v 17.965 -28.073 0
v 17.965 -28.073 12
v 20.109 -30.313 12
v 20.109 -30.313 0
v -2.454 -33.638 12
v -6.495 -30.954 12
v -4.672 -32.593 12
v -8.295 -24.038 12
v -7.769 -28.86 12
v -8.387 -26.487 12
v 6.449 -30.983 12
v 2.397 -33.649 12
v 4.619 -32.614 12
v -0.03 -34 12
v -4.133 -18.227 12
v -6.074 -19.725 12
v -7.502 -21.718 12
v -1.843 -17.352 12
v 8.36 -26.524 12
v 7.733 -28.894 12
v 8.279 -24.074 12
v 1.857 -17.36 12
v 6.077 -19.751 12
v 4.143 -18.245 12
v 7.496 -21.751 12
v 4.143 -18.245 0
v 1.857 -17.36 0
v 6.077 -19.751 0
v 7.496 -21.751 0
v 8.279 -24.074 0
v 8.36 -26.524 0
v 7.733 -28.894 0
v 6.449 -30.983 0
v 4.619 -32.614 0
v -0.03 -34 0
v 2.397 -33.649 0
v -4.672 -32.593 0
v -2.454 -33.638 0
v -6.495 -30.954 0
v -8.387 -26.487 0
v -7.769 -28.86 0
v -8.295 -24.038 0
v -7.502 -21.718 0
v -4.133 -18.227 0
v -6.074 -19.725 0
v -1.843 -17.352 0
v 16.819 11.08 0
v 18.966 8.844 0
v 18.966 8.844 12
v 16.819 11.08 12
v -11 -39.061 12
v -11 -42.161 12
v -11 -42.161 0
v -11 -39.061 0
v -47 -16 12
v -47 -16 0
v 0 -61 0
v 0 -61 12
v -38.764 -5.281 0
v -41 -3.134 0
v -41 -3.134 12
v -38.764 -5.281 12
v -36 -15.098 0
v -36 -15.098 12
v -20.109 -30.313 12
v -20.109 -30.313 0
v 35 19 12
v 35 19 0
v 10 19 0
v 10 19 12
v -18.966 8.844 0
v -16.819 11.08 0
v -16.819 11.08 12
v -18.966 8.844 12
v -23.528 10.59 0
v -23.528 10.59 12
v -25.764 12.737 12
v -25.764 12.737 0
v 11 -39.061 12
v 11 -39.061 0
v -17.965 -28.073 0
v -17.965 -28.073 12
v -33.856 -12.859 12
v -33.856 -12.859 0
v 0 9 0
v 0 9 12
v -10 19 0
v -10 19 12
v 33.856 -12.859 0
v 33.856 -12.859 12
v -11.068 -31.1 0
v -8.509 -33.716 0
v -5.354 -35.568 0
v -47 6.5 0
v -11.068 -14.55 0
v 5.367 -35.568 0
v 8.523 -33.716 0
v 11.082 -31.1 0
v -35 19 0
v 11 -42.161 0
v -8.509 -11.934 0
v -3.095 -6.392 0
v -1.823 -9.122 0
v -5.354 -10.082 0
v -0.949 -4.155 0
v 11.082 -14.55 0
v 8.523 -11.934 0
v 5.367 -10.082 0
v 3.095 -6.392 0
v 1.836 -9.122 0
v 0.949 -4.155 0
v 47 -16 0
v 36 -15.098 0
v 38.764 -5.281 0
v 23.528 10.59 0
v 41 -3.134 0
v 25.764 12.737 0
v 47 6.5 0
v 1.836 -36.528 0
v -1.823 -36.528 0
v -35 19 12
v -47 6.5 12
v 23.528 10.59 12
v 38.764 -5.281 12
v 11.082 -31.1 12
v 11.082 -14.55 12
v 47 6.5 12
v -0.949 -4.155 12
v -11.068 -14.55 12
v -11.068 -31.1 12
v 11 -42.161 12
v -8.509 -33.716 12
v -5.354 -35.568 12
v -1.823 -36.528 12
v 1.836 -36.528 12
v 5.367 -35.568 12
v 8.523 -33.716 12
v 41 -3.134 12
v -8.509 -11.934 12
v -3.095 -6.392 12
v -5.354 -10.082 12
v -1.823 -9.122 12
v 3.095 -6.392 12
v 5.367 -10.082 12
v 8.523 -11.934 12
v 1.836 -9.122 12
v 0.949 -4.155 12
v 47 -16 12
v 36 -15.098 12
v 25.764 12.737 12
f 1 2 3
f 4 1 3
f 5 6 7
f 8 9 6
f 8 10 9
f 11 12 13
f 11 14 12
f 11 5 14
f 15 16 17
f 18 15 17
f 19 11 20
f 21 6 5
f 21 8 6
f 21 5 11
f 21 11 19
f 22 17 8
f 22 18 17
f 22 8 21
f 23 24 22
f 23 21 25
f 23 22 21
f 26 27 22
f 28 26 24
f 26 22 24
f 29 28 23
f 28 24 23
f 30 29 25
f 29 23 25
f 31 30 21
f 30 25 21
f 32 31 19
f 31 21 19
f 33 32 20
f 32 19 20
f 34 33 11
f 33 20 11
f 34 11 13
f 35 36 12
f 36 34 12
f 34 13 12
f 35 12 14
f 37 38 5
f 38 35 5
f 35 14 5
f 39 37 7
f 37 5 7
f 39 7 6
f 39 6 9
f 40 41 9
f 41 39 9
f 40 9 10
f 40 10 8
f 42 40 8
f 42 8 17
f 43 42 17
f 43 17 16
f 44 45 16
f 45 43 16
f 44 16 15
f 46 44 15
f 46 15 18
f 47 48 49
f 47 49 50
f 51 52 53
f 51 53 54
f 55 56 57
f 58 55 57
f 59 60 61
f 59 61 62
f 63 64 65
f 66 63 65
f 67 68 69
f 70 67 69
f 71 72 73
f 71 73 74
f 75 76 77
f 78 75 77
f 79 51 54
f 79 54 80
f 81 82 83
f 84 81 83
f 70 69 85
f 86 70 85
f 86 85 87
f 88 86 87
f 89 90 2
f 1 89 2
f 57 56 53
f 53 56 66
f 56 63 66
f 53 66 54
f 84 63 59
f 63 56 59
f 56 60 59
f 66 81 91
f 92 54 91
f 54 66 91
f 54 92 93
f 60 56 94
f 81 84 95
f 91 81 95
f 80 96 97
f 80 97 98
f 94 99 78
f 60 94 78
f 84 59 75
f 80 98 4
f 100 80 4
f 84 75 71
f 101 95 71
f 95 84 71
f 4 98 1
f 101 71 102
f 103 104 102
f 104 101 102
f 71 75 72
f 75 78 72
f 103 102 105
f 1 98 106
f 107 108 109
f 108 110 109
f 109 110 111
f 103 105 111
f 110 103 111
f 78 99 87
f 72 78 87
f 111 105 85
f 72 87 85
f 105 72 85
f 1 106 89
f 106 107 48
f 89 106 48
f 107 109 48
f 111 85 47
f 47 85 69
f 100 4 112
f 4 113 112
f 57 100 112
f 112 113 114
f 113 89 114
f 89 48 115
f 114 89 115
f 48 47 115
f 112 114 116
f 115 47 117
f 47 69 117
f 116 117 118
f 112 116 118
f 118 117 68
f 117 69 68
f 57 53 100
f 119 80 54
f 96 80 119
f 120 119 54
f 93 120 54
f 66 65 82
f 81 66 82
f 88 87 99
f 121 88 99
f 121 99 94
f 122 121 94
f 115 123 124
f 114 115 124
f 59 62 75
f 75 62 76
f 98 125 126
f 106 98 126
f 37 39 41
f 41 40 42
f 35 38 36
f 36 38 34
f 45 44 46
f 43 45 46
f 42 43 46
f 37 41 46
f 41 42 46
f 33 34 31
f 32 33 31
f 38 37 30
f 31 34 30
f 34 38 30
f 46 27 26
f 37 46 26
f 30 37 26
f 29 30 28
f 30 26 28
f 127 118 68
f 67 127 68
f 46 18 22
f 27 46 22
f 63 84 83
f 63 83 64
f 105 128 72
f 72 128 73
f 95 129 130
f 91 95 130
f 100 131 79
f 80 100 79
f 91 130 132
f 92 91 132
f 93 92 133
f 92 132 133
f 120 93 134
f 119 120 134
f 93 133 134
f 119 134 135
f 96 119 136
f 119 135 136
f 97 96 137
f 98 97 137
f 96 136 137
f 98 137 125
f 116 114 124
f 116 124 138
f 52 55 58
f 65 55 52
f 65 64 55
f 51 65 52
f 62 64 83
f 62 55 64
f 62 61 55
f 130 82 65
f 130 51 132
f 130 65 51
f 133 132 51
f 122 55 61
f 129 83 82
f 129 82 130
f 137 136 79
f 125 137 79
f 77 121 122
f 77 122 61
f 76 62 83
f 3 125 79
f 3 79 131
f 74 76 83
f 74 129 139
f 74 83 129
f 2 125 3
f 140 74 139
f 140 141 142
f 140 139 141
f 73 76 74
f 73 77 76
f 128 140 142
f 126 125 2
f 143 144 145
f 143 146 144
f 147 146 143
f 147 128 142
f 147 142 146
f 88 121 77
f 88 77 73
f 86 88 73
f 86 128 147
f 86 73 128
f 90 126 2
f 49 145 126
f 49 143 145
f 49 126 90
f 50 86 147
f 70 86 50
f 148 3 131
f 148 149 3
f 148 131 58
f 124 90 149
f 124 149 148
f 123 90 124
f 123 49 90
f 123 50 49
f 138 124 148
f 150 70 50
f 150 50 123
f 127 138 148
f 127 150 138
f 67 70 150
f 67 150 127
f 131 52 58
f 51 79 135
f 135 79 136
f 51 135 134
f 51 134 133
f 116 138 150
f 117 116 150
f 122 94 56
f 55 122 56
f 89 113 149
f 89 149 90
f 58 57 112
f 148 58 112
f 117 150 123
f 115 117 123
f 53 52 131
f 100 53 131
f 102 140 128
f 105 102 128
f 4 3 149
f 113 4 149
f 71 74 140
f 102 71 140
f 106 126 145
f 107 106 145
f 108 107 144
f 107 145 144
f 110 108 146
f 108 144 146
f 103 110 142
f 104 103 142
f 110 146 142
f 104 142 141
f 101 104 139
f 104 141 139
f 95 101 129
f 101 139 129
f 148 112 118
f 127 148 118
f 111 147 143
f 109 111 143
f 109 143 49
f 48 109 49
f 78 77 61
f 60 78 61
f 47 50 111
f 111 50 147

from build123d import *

# Parameters (mm, degrees)
F1_DEPTH = 12
F2_W     = 22
F2_H     = 3.1
F3_DEPTH = 25


# Not quite as in the source:
# - a feature names something its author has since deleted; it is built from what else it names


with BuildPart() as f1:
    # F0 (on Top) → F1 (new body)
    with BuildSketch(Plane.XY):
        Polygon((-47, -16), (0, -61), (47, -16), (47, 6.5), (35, 19), (10, 19), (0, 9), (-10, 19), (-35, 19), (-47, 6.5), align=None)
    extrude(amount=F1_DEPTH)

    # F2 (on face) → F3 (cut)
    with BuildSketch(Plane.XY.offset(12)):
        Polygon((38.7636993048, -5.2805951643), (41, -3.1337464969), (25.7642997798, 12.7367745658), (23.5279990846, 10.5899258984), align=None)
        Polygon((17.9653521283, -28.0733723465), (20.1092237756, -30.3125271781), (36, -15.0979541973), (33.8561283527, -12.8587993657), align=None)
        with Locations((0, -40.611379497)):
            Rectangle(F2_W, F2_H)
        Polygon((-17.9653521283, -28.0733723465), (-33.8561283527, -12.8587993657), (-36, -15.0979541973), (-20.1092237756, -30.3125271781), align=None)
        Polygon((3.0954246037, -6.3915316387), (18.9659456664, 8.8441685815), (16.819096999, 11.0804692767), (0.9485759364, -4.1552309435), align=None)
        Polygon((-18.9659456664, 8.8441685815), (-3.0954246037, -6.3915316387), (-0.9485759364, -4.1552309435), (-16.819096999, 11.0804692767), align=None)
        Polygon((-38.7636993048, -5.2805951643), (-23.5279990846, 10.5899258984), (-25.7642997798, 12.7367745658), (-41, -3.1337464969), align=None)
        with BuildLine():
            Line((-11.0683567197, -14.5500370711), (-11.0683567197, -31.0999615422))
            ThreePointArc((-11.0683567197, -31.0999615422), (0.0066432803, -36.6499993066), (11.0816432803, -31.0999615422))
            Line((11.0816432803, -31.0999615422), (11.0816432803, -14.5500370711))
            ThreePointArc((11.0816432803, -14.5500370711), (0.0066432803, -8.9999993066), (-11.0683567197, -14.5500370711))
        make_face()
        with BuildLine():
            ThreePointArc((1.8566432803, -17.3596185624), (-0.0296329992, -33.9999209479), (-1.8433567197, -17.3515544229))
            Line((-1.8433567197, -17.3515544229), (1.8566432803, -17.3596185624))
        make_face(mode=Mode.SUBTRACT)
    extrude(amount=-F3_DEPTH, mode=Mode.SUBTRACT)


solid = f1.part
